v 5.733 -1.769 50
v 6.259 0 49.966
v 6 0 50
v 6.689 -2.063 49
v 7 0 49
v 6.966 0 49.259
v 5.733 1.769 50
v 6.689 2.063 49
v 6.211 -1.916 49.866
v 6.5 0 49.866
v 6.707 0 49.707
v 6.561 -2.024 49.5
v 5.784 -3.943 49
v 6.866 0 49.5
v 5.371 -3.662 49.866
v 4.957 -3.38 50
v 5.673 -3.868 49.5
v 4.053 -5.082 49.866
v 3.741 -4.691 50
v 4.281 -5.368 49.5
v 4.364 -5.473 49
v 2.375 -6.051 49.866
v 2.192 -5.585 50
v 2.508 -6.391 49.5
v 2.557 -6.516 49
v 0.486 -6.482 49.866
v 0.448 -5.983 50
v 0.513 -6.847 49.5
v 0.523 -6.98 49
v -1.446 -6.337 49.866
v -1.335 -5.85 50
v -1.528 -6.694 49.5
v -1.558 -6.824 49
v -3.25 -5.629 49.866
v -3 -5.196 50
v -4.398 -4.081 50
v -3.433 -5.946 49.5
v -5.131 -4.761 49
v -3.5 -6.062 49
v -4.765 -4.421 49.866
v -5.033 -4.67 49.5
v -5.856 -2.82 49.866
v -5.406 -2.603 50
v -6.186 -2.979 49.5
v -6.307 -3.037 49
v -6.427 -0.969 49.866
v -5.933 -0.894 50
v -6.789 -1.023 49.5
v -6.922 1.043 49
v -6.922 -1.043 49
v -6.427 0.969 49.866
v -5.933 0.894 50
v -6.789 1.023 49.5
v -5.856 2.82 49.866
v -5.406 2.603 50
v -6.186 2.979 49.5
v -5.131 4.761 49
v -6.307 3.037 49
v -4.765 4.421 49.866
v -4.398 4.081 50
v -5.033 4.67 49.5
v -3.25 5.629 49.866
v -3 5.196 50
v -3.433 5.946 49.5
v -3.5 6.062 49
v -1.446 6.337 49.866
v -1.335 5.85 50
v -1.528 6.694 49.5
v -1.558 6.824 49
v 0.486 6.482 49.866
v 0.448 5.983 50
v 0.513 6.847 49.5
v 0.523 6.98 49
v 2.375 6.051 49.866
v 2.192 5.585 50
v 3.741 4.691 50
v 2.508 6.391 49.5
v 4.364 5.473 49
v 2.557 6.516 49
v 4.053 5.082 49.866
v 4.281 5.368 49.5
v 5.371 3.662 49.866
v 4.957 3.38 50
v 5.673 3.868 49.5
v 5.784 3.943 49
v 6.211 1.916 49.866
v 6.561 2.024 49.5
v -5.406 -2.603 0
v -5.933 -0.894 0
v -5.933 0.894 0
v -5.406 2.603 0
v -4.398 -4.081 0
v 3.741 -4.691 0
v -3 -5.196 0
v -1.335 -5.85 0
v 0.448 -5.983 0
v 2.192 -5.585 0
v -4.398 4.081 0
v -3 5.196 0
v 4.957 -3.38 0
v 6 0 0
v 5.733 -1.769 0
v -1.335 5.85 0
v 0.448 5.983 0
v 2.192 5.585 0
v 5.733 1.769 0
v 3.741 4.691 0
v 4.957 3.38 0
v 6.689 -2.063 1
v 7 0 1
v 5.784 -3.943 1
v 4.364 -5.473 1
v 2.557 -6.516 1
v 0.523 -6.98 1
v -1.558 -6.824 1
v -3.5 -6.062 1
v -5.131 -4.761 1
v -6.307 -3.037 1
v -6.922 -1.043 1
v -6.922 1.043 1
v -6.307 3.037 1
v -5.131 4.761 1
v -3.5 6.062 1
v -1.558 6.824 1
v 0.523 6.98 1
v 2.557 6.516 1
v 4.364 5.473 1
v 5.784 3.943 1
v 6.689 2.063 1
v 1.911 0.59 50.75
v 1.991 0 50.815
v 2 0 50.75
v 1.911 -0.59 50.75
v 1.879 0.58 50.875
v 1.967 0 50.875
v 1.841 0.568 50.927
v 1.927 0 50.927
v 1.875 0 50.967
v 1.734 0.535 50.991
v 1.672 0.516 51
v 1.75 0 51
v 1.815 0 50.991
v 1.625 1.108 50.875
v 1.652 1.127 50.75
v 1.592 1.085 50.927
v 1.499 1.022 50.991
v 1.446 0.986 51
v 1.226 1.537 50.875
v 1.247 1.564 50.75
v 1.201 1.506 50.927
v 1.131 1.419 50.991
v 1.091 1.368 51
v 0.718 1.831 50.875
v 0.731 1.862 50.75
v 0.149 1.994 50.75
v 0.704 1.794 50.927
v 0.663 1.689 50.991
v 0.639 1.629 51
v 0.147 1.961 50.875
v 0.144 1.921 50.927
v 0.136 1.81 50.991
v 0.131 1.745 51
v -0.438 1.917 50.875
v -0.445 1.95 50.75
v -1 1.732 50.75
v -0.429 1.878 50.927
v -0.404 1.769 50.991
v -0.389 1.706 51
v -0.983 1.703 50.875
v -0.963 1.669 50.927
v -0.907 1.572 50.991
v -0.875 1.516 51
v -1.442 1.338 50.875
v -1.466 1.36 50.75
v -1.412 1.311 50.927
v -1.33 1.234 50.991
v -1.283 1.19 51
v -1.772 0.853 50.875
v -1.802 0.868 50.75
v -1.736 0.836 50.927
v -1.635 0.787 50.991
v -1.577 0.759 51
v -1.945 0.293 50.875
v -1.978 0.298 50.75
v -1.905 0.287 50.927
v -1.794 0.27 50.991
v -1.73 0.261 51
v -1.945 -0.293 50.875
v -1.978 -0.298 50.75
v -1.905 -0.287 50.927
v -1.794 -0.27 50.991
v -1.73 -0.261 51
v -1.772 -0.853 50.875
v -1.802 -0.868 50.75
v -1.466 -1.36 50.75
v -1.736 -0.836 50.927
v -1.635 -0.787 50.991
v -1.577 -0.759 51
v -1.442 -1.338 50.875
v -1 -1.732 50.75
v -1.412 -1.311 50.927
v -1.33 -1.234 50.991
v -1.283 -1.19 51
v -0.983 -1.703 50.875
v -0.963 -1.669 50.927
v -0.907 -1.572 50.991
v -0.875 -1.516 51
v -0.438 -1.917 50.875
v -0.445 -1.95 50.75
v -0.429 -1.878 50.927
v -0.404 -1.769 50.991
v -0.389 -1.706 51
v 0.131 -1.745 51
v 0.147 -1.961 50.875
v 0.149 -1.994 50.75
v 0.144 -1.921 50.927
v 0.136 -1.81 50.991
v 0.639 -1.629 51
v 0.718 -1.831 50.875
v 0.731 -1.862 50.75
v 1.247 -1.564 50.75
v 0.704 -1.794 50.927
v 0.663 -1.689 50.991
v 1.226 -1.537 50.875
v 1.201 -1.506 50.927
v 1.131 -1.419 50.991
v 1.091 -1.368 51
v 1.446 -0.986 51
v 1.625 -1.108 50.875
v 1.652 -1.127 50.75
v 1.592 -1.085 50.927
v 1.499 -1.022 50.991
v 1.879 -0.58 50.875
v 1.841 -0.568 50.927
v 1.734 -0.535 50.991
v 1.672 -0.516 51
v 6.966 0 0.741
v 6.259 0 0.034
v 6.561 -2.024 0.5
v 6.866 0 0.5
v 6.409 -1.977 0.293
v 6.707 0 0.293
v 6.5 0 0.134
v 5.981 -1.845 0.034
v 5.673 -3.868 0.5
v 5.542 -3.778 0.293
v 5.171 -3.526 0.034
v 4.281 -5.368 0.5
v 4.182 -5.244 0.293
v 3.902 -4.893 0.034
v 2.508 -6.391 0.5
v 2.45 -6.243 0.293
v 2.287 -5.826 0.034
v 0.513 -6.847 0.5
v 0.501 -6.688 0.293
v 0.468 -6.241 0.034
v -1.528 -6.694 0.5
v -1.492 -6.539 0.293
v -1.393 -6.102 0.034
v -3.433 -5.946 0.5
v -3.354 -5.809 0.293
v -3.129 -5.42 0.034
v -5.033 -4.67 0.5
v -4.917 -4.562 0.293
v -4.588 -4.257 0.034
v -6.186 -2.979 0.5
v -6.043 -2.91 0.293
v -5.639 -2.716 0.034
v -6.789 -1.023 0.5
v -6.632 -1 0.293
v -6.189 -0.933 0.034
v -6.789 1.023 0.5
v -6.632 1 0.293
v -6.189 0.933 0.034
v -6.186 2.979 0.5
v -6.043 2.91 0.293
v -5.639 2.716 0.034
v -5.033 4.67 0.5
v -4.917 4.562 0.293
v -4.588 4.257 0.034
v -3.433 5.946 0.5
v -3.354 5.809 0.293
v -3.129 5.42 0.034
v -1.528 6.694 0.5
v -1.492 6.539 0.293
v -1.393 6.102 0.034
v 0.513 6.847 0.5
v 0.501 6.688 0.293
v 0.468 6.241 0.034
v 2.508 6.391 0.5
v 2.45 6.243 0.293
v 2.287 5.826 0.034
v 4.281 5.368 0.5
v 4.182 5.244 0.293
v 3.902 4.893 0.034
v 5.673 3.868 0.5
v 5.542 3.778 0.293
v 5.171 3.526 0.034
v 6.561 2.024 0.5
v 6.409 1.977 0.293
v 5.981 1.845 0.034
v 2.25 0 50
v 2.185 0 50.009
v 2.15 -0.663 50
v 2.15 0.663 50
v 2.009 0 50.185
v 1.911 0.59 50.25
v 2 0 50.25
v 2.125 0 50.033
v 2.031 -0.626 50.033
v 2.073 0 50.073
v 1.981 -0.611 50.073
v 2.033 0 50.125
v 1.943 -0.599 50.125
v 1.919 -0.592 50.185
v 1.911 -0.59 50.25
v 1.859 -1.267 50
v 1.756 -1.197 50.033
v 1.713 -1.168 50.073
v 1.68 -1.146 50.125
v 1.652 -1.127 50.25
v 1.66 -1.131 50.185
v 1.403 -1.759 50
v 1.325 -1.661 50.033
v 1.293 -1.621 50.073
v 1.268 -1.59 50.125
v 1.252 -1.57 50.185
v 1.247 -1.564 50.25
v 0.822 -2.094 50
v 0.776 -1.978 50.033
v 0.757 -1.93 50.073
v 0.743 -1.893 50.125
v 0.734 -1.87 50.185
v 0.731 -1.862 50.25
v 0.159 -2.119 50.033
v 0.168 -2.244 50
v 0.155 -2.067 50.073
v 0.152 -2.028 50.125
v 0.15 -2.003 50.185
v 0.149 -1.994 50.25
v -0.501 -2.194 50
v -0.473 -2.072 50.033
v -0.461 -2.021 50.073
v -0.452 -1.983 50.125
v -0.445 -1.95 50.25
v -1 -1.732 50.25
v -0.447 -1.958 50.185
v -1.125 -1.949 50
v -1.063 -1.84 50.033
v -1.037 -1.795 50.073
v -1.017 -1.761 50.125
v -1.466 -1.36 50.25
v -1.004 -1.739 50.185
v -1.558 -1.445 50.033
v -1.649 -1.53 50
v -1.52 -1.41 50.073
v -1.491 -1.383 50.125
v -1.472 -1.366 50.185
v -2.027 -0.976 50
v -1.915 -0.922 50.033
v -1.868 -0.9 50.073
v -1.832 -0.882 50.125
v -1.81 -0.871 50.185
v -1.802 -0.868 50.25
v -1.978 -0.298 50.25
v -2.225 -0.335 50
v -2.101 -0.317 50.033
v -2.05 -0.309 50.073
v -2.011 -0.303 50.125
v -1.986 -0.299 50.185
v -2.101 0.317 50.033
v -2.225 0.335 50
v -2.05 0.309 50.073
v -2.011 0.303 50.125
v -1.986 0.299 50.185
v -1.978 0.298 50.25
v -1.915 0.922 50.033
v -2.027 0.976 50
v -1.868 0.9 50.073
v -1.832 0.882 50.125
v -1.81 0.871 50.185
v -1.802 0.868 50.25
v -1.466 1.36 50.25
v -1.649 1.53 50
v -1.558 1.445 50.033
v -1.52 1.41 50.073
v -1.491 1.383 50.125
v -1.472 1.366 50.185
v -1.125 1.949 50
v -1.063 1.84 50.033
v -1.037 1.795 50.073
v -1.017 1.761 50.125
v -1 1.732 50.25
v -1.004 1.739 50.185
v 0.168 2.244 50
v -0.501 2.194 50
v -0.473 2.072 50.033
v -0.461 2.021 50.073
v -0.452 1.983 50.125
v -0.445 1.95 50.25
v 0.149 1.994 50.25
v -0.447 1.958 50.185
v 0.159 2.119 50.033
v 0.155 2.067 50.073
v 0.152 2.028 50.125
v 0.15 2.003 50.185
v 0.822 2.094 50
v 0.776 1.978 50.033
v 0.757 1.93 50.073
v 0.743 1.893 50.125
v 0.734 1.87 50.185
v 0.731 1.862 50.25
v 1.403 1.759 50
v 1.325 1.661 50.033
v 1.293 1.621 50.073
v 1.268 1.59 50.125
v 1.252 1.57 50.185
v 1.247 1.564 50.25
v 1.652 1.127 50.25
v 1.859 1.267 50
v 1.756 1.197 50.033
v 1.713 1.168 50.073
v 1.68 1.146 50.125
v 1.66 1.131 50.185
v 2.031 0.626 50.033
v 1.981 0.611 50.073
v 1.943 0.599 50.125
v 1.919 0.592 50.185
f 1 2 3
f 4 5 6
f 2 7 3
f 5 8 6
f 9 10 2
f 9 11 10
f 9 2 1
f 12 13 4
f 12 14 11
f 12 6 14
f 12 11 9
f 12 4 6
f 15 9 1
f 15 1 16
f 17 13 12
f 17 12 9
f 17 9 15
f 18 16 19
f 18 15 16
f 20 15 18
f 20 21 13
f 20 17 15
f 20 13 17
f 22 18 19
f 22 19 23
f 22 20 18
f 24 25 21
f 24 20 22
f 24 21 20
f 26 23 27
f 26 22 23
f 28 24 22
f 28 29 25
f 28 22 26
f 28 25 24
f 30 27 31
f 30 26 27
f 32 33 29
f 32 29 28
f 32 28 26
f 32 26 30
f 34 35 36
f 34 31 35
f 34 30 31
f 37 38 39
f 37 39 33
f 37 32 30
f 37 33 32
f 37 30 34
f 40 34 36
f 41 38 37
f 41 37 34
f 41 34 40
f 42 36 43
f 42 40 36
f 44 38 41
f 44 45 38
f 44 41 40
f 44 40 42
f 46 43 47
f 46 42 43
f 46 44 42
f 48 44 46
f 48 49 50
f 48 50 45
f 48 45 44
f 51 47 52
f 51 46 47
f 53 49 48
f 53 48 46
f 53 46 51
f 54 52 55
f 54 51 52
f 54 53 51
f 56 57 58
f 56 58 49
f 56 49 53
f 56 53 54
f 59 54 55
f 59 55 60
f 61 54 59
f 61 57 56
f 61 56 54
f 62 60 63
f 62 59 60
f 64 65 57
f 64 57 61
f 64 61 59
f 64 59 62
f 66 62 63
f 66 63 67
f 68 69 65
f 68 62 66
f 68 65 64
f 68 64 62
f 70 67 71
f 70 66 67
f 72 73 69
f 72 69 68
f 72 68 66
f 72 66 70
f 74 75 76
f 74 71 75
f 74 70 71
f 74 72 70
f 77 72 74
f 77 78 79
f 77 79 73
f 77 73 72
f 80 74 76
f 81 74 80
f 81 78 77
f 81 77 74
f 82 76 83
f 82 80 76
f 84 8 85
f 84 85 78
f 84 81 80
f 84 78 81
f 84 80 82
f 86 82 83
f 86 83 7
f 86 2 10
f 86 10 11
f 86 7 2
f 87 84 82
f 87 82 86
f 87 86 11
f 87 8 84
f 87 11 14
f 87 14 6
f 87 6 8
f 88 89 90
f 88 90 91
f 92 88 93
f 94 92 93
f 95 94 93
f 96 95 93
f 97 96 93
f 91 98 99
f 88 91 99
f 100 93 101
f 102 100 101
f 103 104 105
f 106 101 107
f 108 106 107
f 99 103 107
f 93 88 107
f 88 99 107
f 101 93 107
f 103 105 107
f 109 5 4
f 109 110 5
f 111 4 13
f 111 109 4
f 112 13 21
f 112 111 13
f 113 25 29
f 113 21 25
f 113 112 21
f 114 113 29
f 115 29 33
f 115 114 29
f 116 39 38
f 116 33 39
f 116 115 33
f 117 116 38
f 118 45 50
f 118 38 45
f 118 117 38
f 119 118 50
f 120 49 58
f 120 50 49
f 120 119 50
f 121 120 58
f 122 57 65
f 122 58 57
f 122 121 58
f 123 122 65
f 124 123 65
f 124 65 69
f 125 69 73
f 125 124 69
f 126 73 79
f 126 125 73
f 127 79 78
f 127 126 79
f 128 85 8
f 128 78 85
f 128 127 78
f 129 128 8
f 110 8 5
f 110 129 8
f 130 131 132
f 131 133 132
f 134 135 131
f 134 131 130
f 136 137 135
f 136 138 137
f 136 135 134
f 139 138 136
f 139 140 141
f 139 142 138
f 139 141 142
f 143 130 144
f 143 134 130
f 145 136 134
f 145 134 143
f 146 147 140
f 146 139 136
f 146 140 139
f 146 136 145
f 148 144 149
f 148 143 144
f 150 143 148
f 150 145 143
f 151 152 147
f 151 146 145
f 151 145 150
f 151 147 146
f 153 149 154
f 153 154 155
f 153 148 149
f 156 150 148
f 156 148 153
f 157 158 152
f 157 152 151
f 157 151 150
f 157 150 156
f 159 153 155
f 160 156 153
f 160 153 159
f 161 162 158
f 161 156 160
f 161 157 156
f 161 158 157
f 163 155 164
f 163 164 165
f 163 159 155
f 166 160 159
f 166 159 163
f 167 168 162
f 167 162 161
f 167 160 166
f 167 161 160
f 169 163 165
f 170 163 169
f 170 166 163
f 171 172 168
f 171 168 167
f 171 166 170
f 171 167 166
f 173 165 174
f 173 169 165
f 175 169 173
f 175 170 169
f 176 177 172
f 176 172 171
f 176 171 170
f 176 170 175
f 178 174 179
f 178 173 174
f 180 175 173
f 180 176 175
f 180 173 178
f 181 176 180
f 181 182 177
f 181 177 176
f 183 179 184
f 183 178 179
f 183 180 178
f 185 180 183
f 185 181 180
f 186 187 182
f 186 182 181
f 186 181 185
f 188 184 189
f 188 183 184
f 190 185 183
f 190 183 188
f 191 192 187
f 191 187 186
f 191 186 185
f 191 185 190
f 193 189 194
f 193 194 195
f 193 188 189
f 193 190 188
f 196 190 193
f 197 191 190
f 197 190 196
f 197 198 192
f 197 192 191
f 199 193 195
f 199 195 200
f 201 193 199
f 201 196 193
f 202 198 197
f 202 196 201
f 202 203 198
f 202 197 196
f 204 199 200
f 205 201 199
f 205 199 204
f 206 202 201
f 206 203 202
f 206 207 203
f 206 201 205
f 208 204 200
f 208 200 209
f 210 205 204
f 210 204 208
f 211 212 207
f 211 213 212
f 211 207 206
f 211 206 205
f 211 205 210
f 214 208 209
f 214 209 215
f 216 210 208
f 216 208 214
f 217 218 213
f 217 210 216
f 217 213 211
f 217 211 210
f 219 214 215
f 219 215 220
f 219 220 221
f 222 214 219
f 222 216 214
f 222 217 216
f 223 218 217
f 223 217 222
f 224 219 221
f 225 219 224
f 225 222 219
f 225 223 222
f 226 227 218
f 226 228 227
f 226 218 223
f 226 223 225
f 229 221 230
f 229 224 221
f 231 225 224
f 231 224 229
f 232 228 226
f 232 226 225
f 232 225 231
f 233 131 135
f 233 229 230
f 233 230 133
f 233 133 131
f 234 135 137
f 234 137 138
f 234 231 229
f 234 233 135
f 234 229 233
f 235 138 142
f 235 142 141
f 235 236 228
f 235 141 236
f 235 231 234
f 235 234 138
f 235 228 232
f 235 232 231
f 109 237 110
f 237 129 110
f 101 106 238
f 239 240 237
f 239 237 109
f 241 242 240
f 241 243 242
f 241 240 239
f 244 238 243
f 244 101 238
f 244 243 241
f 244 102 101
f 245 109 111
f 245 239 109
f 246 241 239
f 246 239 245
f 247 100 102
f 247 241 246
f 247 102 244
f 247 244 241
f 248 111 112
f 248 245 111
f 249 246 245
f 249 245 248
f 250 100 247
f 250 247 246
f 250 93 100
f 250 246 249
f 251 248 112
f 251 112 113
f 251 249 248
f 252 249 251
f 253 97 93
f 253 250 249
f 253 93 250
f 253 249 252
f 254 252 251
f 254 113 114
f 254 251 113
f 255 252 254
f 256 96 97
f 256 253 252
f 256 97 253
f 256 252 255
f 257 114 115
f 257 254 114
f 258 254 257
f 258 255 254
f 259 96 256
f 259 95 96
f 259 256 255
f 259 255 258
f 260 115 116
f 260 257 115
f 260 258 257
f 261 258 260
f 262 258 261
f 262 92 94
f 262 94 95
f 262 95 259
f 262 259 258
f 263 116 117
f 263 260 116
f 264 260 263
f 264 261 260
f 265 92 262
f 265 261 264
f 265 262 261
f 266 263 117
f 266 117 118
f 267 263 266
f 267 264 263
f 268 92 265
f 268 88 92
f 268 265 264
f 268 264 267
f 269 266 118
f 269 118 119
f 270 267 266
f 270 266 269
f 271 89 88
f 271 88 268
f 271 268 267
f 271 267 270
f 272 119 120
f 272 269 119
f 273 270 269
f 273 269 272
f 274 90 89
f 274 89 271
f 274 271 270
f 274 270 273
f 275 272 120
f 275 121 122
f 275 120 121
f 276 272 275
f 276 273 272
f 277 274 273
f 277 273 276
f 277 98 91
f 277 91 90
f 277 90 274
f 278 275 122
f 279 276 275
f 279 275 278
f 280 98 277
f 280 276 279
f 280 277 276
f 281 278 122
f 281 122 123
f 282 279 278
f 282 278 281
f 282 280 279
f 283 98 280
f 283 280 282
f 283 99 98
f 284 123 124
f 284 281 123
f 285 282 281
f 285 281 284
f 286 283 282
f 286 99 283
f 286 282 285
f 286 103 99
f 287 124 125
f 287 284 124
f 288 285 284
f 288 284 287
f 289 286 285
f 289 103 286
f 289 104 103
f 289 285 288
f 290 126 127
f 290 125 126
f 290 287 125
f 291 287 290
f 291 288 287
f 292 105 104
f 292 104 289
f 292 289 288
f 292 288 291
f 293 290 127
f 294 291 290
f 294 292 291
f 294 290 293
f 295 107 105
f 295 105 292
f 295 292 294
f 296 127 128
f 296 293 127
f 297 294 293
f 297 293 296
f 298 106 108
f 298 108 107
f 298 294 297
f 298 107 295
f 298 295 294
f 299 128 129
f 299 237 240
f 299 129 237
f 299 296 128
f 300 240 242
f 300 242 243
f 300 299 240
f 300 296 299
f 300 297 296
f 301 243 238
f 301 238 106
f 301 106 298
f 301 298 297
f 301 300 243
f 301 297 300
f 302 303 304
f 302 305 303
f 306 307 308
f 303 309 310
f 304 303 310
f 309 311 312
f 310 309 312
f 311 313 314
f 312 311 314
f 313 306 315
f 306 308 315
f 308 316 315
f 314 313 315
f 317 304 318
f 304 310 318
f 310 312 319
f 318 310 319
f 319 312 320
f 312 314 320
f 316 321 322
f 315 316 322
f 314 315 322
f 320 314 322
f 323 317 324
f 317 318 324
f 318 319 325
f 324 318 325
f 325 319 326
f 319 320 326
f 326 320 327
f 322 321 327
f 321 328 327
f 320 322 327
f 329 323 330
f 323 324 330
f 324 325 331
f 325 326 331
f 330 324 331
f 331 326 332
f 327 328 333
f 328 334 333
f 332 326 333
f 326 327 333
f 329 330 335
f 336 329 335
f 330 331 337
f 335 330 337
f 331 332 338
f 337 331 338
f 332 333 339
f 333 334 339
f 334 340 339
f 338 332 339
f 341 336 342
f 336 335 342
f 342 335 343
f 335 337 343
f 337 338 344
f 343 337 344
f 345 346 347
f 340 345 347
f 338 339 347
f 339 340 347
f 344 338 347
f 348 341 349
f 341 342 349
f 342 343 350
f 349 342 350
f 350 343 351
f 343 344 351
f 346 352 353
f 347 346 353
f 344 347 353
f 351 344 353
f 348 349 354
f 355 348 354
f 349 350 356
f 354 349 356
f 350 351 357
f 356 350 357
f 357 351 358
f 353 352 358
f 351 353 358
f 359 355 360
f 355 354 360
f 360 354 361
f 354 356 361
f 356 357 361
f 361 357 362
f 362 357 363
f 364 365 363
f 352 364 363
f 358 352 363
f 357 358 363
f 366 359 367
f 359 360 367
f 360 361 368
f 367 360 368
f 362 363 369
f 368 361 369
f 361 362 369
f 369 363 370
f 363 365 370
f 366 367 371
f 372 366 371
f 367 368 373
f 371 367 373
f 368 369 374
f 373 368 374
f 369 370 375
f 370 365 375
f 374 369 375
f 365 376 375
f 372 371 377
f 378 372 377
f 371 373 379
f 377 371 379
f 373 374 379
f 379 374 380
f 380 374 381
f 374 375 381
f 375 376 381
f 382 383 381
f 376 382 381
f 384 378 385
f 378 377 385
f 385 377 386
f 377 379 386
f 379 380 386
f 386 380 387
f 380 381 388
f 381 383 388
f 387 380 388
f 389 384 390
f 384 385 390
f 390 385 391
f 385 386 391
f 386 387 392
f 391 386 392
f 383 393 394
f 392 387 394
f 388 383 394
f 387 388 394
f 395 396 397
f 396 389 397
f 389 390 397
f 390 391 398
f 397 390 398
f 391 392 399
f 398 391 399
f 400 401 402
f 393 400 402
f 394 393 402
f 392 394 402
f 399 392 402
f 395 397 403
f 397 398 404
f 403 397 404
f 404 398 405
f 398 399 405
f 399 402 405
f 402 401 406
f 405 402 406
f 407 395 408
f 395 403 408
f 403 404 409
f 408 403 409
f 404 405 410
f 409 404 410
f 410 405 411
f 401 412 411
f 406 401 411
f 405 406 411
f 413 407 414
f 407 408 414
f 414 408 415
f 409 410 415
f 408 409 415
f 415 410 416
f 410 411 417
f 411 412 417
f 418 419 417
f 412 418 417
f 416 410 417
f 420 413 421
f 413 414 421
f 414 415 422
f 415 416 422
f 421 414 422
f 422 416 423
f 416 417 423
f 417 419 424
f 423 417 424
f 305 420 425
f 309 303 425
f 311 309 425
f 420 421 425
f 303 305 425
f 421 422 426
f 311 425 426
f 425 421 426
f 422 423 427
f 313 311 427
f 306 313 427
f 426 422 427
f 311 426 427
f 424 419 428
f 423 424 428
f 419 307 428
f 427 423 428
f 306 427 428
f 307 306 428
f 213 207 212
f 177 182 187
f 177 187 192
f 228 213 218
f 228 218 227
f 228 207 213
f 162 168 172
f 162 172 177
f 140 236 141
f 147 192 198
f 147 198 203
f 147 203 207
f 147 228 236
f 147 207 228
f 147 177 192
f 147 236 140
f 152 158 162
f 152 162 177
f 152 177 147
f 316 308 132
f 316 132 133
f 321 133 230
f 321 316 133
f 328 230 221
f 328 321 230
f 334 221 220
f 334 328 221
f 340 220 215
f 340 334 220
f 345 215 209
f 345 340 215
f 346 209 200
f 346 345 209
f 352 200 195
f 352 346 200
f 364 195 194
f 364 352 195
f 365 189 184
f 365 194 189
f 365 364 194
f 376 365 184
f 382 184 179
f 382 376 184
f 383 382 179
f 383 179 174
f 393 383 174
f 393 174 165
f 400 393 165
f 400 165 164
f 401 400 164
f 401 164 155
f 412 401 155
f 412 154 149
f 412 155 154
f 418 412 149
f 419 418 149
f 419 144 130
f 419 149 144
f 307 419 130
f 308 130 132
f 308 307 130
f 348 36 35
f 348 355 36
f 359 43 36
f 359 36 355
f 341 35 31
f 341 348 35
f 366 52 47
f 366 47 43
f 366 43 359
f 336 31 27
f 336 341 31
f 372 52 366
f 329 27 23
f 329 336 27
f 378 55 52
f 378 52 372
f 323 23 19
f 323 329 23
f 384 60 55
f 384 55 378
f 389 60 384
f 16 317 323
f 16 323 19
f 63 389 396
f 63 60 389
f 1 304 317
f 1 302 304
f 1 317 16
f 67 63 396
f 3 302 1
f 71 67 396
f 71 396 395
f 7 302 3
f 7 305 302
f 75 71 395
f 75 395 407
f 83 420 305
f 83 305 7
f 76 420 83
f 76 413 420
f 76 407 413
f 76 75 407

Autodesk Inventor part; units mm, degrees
ref_plane "YZ Plane" through (0, 0, 0) normal (1, 0, 0) x (0, 1, 0)
ref_plane "XZ Plane" through (0, 0, 0) normal (0, 1, 0) x (-1, 0, 0)
ref_plane "XY Plane" through (0, 0, 0) normal (0, 0, 1) x (1, 0, 0)
sketch "Szkic1" plane through (0, 0, 0) normal (0, 0, 1) x (1, 0, 0)
  circle A0 centre (0, 0) radius 7
  dimension "d0" = 14
extrude "Wyciągnięcie proste1" add sketch "Szkic1" along normal blind 50
sketch "Szkic2" plane through (0, 0, 50) normal (0, 0, 1) x (1, 0, 0)
  circle A0 centre (0, 0) radius 2
  dimension "d3" = 4
extrude "Wyciągnięcie proste2" add sketch "Szkic2" along normal blind 1
fillet "Zaokrąglenie1" radius 0.25 2 edges at (-2, 0, 51) (-2, 0, 50)
fillet "Zaokrąglenie2" radius 1 2 edges at (-7, 0, 50) (-7, 0, 0)
properties part number "Bateria"
